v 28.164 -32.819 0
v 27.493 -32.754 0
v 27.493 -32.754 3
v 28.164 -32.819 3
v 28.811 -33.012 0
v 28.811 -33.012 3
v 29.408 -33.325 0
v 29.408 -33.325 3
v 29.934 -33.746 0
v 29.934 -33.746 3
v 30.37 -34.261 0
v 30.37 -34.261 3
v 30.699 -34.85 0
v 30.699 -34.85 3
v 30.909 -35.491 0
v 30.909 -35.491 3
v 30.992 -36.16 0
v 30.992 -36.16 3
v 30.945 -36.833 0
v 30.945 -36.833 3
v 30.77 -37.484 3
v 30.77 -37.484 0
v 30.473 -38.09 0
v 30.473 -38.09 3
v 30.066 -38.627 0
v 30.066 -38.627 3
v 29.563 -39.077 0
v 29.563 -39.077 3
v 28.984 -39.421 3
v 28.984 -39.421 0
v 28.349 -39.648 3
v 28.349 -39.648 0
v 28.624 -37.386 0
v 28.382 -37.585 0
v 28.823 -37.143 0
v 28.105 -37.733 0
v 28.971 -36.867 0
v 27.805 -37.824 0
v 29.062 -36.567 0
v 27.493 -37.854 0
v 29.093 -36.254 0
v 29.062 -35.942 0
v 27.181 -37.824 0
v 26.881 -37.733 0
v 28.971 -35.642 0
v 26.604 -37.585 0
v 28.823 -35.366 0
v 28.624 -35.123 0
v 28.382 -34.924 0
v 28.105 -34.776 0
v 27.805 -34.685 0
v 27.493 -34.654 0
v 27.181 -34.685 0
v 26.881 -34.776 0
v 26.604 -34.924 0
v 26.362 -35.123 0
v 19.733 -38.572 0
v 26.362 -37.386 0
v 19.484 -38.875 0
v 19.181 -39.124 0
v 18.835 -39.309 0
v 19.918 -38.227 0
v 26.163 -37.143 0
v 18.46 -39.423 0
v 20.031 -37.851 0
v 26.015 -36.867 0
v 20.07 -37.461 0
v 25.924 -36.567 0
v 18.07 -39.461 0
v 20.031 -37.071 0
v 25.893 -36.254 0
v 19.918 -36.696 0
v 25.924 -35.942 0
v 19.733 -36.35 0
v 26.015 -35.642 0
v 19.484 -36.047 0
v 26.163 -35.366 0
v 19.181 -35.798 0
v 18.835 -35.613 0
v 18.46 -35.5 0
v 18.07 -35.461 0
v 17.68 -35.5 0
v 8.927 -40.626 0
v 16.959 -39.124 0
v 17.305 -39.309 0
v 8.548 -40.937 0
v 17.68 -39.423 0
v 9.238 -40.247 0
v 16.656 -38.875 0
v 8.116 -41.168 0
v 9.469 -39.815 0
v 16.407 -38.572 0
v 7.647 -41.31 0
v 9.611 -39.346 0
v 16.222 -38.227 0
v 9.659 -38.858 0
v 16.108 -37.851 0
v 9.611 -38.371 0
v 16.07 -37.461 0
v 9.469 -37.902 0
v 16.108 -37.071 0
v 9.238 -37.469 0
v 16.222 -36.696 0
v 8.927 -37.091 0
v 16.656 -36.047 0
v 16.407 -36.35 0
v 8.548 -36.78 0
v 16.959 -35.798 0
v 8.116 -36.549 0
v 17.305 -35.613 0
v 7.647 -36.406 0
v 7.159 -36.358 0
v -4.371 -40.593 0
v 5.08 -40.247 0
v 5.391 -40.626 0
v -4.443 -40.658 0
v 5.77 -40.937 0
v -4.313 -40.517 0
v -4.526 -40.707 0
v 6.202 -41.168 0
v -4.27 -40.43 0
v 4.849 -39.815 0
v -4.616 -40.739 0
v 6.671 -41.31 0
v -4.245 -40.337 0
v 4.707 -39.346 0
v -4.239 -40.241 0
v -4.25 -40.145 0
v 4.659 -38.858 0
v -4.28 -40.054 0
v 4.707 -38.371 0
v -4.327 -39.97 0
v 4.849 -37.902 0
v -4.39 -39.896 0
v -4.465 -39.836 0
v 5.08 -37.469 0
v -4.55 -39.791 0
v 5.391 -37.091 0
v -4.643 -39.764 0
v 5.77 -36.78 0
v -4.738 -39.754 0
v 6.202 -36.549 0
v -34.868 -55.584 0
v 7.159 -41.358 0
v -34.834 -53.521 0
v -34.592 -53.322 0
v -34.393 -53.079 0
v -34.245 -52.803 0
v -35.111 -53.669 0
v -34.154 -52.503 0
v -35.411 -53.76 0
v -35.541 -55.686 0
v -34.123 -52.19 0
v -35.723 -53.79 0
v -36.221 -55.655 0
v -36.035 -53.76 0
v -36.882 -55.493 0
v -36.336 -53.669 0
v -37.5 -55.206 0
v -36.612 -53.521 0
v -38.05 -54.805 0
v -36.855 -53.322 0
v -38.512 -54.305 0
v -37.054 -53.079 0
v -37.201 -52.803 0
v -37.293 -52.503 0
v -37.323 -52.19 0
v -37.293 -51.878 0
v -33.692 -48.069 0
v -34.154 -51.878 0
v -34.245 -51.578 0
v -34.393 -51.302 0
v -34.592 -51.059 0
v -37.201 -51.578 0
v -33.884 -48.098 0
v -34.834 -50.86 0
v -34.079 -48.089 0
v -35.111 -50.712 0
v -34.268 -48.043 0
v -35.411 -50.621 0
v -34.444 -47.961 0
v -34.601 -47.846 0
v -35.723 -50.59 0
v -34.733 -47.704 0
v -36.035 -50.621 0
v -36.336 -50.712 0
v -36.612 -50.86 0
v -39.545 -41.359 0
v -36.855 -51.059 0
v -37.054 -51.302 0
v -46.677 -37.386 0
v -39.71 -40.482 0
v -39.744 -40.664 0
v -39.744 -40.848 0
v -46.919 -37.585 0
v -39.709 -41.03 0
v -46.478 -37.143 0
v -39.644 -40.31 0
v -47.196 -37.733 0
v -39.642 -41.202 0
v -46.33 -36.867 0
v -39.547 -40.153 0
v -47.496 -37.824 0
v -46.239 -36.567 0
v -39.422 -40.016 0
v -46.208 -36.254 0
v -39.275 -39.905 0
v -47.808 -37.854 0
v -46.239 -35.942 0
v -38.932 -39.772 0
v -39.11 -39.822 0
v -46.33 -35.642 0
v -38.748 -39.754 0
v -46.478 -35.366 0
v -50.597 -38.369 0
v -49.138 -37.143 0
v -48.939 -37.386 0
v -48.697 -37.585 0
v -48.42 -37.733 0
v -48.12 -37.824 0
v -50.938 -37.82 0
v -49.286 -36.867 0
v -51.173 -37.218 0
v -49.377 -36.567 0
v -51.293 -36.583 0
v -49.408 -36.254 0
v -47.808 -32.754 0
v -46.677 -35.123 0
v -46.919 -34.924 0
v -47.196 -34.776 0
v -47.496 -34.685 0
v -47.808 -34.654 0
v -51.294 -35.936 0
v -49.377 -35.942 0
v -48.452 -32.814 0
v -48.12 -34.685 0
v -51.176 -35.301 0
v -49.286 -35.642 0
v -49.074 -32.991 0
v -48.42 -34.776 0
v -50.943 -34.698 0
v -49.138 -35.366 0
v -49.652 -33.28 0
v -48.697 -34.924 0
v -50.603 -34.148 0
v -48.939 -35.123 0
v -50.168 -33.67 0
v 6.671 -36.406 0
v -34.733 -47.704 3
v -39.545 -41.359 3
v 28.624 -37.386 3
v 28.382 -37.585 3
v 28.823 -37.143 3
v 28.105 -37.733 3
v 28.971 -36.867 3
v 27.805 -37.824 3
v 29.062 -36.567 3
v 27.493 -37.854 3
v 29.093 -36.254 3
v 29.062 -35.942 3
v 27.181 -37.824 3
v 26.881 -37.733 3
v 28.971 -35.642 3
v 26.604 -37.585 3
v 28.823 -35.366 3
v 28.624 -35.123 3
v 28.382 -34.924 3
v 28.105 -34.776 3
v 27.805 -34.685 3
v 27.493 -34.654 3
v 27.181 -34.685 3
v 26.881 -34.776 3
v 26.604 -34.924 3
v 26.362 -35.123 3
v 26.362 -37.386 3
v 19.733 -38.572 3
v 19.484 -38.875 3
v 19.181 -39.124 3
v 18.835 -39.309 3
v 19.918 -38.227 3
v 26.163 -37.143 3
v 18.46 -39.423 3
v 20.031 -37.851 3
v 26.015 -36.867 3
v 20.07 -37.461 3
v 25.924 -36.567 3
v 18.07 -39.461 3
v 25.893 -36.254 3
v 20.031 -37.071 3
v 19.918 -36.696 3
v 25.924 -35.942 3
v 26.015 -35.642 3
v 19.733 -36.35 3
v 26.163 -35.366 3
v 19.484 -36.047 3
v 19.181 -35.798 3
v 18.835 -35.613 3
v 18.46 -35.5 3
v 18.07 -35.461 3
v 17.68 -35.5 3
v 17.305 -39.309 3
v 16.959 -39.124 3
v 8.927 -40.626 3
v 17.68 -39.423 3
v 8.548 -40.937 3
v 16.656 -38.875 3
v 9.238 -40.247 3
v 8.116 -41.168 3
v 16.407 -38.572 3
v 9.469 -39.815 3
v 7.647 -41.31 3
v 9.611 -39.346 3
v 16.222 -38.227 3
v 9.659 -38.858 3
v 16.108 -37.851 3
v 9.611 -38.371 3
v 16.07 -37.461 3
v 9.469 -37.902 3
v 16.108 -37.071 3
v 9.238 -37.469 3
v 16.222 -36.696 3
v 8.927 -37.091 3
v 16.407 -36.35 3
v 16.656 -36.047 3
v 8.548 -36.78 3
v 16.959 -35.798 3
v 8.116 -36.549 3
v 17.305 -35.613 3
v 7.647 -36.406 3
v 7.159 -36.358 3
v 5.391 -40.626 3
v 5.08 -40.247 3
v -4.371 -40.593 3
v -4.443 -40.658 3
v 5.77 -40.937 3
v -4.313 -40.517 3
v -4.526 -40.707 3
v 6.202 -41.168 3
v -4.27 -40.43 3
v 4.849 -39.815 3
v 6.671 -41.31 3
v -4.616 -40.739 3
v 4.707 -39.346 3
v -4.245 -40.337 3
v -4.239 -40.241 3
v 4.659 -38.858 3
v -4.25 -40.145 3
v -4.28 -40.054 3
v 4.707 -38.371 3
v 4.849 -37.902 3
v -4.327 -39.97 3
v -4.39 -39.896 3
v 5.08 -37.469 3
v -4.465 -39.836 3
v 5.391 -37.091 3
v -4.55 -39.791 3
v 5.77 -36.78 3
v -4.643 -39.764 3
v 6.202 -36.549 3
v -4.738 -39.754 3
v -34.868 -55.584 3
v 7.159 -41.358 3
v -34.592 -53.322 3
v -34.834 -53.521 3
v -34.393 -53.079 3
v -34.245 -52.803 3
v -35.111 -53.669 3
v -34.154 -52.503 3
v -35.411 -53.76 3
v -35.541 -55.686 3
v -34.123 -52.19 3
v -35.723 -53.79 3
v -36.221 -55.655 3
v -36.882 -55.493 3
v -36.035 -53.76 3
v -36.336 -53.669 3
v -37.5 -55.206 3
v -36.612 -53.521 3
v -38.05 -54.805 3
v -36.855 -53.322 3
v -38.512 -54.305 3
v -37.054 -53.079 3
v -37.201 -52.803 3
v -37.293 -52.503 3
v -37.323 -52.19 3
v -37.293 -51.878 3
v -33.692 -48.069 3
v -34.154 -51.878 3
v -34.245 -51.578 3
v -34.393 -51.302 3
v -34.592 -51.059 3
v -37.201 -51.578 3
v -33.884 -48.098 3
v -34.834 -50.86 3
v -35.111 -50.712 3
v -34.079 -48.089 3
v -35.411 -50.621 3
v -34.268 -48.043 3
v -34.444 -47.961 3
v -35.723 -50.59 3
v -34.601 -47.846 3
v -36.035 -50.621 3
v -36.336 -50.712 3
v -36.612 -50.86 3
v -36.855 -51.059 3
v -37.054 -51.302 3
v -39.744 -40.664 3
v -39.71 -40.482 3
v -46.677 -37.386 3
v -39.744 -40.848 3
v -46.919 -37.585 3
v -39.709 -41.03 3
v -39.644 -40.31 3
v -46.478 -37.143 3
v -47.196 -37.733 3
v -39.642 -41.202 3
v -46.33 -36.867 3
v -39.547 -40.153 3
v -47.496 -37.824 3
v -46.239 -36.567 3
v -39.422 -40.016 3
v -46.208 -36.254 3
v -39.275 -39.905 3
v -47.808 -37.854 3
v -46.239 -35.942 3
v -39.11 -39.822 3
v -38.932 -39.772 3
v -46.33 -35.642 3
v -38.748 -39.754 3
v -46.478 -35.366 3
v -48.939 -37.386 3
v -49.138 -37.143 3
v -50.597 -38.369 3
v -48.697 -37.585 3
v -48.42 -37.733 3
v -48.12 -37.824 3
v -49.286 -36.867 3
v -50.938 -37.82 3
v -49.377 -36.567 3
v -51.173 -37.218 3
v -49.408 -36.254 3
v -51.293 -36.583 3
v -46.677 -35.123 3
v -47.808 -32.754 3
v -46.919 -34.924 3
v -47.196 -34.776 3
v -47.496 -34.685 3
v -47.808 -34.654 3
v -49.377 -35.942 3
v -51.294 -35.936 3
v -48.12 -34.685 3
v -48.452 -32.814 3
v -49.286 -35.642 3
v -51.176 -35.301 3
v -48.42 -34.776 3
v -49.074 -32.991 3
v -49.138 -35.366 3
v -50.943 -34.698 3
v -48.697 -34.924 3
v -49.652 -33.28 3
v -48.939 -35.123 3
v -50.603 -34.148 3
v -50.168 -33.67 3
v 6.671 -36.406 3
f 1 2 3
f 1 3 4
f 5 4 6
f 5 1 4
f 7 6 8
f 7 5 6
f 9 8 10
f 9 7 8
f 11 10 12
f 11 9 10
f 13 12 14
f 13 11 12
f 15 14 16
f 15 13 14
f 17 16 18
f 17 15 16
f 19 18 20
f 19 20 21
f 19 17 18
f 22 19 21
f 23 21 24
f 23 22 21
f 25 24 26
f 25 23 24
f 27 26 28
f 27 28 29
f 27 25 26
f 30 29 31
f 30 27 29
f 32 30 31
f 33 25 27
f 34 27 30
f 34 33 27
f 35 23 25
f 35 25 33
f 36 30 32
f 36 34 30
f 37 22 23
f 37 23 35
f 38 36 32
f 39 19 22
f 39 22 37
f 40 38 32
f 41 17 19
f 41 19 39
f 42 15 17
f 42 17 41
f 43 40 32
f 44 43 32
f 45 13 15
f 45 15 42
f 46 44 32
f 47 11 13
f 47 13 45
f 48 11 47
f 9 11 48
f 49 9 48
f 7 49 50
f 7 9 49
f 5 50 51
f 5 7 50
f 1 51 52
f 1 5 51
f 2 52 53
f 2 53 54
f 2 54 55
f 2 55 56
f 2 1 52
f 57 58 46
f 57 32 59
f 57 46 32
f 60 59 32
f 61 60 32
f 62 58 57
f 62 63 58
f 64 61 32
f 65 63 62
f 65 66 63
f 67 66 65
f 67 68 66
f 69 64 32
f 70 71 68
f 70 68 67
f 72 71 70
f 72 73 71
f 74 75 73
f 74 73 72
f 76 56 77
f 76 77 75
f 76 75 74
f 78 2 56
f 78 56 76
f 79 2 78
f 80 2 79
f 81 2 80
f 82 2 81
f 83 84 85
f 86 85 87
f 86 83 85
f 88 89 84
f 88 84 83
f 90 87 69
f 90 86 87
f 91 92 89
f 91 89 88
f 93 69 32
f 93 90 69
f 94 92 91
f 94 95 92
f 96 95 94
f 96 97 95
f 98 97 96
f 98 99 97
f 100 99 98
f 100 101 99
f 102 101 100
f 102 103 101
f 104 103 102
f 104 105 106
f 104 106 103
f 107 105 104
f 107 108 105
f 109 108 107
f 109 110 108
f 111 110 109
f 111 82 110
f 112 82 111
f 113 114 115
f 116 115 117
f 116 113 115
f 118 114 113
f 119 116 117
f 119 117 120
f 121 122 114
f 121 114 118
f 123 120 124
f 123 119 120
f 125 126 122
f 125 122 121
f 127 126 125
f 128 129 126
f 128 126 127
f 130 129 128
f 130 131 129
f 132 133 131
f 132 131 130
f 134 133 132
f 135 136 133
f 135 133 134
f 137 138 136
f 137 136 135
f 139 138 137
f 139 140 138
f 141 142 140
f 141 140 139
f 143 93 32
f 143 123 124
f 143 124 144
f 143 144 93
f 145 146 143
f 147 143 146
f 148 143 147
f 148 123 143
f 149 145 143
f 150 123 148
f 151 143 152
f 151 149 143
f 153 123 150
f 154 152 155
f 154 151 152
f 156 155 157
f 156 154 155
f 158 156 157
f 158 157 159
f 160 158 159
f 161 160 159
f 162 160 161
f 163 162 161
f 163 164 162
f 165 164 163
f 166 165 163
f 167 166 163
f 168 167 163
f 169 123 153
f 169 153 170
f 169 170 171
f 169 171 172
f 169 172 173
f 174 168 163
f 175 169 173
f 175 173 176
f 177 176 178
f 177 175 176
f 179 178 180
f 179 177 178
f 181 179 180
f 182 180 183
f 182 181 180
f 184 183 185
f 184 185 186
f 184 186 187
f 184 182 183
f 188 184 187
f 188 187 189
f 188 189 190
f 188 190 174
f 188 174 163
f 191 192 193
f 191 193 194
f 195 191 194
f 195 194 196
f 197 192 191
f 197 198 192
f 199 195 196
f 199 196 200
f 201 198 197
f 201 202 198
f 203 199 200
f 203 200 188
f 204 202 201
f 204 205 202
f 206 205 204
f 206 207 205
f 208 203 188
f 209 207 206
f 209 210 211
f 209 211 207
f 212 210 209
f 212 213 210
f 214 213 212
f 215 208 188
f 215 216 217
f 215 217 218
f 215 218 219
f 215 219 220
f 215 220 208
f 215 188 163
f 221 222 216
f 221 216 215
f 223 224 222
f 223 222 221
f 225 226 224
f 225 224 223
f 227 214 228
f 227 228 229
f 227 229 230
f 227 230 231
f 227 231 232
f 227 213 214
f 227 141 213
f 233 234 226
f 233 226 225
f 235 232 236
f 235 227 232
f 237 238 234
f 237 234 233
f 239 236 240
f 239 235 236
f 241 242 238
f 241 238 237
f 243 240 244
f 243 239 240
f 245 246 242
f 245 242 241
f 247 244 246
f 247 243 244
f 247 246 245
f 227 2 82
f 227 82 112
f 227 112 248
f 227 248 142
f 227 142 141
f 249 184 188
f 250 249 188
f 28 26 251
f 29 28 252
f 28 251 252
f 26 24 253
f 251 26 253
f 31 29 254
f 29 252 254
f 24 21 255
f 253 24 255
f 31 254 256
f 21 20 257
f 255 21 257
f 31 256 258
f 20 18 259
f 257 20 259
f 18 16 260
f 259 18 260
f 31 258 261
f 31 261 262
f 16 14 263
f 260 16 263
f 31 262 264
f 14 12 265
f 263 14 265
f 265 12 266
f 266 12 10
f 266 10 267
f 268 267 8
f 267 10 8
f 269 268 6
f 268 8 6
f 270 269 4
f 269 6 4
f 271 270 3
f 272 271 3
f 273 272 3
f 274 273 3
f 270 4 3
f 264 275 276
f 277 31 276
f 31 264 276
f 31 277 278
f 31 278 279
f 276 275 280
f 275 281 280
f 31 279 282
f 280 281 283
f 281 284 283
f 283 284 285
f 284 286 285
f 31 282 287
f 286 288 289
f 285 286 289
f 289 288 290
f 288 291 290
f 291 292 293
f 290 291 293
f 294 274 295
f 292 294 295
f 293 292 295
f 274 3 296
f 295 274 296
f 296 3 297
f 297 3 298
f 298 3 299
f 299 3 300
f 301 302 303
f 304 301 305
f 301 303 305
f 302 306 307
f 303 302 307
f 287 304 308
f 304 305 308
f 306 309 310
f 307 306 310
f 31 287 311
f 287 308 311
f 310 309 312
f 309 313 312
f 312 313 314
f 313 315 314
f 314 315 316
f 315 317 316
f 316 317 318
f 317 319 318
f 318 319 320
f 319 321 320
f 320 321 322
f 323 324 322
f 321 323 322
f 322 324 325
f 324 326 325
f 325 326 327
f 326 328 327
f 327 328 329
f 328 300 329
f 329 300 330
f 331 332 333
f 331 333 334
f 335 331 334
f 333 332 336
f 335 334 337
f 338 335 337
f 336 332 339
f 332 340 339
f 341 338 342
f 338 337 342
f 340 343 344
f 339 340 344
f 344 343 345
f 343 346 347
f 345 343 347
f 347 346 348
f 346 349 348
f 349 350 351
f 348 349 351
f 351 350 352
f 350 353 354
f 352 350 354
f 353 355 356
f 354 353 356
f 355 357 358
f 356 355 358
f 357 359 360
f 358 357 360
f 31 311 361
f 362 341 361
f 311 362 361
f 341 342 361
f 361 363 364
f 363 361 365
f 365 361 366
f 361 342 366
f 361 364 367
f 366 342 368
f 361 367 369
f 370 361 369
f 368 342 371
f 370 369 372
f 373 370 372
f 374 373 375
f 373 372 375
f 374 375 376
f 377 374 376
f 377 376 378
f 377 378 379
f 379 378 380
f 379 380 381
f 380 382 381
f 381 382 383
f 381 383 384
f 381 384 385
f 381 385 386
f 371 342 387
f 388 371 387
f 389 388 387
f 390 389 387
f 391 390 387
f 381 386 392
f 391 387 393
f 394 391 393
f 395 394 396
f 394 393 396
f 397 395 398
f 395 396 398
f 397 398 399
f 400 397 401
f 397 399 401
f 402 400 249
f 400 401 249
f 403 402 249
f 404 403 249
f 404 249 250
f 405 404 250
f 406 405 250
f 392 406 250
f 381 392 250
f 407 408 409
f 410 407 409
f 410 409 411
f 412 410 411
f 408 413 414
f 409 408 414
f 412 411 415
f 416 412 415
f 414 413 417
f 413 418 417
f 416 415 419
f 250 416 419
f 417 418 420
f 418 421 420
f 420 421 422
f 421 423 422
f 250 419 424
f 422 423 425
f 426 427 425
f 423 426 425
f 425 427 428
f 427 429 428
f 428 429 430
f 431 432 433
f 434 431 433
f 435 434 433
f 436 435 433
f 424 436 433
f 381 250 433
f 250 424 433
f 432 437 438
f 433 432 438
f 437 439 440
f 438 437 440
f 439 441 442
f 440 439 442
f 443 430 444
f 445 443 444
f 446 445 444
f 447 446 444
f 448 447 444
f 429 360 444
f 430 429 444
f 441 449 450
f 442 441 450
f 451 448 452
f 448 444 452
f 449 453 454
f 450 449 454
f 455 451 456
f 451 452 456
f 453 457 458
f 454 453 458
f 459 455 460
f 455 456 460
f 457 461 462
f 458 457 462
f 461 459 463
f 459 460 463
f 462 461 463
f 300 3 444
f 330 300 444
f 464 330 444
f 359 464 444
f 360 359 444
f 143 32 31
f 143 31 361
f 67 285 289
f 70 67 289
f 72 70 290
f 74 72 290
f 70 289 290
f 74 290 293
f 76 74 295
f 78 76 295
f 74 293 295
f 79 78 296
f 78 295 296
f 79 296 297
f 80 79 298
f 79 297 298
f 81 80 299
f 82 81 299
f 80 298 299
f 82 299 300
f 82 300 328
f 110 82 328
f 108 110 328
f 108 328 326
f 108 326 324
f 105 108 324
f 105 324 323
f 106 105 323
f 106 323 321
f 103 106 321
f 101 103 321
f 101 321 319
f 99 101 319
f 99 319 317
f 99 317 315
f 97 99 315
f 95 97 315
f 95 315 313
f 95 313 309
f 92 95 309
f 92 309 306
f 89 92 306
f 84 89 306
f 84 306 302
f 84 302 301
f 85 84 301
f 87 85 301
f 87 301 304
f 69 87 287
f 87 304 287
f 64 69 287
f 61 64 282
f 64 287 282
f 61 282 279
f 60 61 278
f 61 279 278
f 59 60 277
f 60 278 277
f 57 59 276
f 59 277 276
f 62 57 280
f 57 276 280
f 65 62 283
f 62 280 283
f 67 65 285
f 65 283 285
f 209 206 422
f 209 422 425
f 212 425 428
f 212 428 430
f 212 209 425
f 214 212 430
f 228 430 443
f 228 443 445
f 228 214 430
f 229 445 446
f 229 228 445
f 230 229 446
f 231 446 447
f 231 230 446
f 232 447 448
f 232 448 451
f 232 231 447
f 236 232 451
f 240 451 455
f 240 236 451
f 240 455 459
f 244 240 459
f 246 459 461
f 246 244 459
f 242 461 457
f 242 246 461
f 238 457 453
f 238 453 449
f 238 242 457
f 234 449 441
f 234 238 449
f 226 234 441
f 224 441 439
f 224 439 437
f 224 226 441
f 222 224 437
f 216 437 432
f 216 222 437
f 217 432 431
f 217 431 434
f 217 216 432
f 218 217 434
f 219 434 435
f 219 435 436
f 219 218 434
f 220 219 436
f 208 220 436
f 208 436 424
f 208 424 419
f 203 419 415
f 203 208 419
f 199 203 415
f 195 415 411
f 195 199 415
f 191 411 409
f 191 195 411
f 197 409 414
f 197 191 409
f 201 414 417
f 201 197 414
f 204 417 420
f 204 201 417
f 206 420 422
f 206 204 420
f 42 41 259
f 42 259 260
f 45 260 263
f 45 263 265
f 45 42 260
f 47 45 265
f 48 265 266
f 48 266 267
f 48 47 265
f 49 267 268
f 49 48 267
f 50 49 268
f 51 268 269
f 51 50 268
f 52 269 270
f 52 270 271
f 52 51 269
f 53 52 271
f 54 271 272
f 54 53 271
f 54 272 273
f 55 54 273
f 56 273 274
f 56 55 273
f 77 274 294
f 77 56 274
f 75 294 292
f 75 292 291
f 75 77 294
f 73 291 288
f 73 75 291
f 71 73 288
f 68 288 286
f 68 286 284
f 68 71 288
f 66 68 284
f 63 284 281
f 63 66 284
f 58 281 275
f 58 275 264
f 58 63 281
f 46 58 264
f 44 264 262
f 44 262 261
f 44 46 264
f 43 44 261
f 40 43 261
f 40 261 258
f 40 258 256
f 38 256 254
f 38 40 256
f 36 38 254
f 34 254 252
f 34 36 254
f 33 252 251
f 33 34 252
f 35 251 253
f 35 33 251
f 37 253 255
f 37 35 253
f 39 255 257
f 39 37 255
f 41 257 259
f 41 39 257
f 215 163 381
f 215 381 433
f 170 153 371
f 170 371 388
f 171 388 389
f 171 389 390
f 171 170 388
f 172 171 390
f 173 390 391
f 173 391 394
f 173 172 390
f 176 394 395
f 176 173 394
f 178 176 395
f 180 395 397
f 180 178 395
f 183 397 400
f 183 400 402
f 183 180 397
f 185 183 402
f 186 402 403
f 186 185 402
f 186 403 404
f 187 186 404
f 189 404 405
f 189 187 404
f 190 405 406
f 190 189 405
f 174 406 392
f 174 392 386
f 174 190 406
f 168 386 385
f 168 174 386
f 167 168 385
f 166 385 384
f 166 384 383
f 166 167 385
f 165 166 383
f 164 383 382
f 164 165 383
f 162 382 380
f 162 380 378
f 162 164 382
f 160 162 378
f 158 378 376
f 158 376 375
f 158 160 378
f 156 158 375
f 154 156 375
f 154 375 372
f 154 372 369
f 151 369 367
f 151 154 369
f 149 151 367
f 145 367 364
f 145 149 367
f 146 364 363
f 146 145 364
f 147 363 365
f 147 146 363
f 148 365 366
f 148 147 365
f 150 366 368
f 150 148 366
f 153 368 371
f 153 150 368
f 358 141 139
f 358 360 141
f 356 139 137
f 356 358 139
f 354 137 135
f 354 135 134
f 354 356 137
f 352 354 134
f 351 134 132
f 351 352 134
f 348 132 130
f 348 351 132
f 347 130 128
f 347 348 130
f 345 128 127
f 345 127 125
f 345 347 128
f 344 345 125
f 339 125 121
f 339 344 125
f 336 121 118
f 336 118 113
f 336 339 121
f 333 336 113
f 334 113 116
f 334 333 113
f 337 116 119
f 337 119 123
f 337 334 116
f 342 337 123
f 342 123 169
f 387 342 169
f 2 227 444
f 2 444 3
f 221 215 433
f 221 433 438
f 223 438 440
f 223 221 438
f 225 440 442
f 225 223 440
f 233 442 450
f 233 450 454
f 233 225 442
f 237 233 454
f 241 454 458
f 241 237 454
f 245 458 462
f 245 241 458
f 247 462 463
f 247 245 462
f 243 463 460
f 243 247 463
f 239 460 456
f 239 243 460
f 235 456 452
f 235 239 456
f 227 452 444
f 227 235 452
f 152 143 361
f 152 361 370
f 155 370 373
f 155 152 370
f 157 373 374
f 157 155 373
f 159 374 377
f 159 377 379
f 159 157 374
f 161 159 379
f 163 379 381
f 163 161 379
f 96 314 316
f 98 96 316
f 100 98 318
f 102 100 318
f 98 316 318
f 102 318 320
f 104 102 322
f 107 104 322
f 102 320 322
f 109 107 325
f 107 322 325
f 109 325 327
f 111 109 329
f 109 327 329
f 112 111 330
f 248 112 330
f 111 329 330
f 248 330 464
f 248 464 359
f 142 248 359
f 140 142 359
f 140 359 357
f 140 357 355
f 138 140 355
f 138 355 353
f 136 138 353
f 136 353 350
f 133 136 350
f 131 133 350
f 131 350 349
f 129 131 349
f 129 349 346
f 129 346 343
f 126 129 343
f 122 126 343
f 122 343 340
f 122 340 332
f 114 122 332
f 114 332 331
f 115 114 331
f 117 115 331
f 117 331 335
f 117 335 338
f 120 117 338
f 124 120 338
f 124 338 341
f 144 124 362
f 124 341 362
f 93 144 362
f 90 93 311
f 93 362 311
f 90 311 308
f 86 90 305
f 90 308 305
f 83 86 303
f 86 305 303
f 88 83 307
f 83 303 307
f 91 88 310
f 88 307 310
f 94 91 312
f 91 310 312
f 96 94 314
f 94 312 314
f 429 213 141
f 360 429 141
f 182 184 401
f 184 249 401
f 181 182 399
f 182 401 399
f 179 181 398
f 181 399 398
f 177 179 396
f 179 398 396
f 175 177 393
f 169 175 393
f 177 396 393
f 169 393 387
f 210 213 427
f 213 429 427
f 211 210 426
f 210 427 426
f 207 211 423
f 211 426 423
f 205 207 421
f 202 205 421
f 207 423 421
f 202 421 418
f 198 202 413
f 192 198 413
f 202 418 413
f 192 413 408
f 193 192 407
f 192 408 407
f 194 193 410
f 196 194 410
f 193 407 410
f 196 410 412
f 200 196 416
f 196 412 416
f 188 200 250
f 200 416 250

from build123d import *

# Parameters (mm, degrees)
SKETCH_1_R          = 1.6
EXTRUDE_1_DEPTH     = 3
FILLET_1_R          = 0.5
FILLET_2_R          = 1
SKETCH_2_R          = 2.5
SKETCH_2_R_2        = 2
CUT_EXTRUDE_1_DEPTH = 76.782265655


with BuildPart() as part:
    # ｽｹｯﾁ1 → ﾎﾞｽ - 押し出し1 (new body)
    with BuildSketch(Plane.XY):
        with BuildLine():
            Line((-47.808090415, -32.754468565), (27.492971995, -32.754468565))
            ThreePointArc((27.492971995, -32.754468565), (30.96632686, -35.823416389), (28.348513235, -39.64829372))
            Line((28.348513235, -39.64829372), (-34.86772632, -55.584323858))
            ThreePointArc((-34.86772632, -55.584323858), (-36.882286825, -55.493024152), (-38.512072834, -54.305342702))
            Line((-38.512072834, -54.305342702), (-50.596895689, -38.369312564))
            ThreePointArc((-50.596895689, -38.369312564), (-50.942731861, -34.697541141), (-47.808090415, -32.754468565))
        make_face()
        with Locations((-47.808090415, -36.254468565)):
            Circle(SKETCH_1_R, mode=Mode.SUBTRACT)
        with Locations((27.492971995, -36.254468565)):
            Circle(SKETCH_1_R, mode=Mode.SUBTRACT)
        with Locations((-35.72326756, -52.190498703)):
            Circle(SKETCH_1_R, mode=Mode.SUBTRACT)
        Polygon((-40.761361774, -39.754468565), (-0.709511909, -39.754468565), (-34.333570517, -48.230676816), align=None, mode=Mode.SUBTRACT)
    extrude(amount=EXTRUDE_1_DEPTH)

    # ﾌｨﾚｯﾄ1
    fillet_1_edges = [part.edges().sort_by_distance(p)[0] for p in [
        (-0.709511909, -39.754468565, 1.5),
    ]]
    fillet(fillet_1_edges, radius=FILLET_1_R)

    # ﾌｨﾚｯﾄ2
    fillet_2_edges = [part.edges().sort_by_distance(p)[0] for p in [
        (-40.761361774, -39.754468565, 1.5),
        (-34.333570517, -48.230676816, 1.5),
    ]]
    fillet(fillet_2_edges, radius=FILLET_2_R)

    # ｽｹｯﾁ2 → ｶｯﾄ - 押し出し1 (cut, through all)
    with BuildSketch(Plane.XY.offset(3)):
        with Locations((7.159021017, -38.858395913)):
            Circle(SKETCH_2_R)
        with Locations((18.069921542, -37.461166604)):
            Circle(SKETCH_2_R_2)
    extrude(amount=-CUT_EXTRUDE_1_DEPTH, mode=Mode.SUBTRACT)


solid = part.part
